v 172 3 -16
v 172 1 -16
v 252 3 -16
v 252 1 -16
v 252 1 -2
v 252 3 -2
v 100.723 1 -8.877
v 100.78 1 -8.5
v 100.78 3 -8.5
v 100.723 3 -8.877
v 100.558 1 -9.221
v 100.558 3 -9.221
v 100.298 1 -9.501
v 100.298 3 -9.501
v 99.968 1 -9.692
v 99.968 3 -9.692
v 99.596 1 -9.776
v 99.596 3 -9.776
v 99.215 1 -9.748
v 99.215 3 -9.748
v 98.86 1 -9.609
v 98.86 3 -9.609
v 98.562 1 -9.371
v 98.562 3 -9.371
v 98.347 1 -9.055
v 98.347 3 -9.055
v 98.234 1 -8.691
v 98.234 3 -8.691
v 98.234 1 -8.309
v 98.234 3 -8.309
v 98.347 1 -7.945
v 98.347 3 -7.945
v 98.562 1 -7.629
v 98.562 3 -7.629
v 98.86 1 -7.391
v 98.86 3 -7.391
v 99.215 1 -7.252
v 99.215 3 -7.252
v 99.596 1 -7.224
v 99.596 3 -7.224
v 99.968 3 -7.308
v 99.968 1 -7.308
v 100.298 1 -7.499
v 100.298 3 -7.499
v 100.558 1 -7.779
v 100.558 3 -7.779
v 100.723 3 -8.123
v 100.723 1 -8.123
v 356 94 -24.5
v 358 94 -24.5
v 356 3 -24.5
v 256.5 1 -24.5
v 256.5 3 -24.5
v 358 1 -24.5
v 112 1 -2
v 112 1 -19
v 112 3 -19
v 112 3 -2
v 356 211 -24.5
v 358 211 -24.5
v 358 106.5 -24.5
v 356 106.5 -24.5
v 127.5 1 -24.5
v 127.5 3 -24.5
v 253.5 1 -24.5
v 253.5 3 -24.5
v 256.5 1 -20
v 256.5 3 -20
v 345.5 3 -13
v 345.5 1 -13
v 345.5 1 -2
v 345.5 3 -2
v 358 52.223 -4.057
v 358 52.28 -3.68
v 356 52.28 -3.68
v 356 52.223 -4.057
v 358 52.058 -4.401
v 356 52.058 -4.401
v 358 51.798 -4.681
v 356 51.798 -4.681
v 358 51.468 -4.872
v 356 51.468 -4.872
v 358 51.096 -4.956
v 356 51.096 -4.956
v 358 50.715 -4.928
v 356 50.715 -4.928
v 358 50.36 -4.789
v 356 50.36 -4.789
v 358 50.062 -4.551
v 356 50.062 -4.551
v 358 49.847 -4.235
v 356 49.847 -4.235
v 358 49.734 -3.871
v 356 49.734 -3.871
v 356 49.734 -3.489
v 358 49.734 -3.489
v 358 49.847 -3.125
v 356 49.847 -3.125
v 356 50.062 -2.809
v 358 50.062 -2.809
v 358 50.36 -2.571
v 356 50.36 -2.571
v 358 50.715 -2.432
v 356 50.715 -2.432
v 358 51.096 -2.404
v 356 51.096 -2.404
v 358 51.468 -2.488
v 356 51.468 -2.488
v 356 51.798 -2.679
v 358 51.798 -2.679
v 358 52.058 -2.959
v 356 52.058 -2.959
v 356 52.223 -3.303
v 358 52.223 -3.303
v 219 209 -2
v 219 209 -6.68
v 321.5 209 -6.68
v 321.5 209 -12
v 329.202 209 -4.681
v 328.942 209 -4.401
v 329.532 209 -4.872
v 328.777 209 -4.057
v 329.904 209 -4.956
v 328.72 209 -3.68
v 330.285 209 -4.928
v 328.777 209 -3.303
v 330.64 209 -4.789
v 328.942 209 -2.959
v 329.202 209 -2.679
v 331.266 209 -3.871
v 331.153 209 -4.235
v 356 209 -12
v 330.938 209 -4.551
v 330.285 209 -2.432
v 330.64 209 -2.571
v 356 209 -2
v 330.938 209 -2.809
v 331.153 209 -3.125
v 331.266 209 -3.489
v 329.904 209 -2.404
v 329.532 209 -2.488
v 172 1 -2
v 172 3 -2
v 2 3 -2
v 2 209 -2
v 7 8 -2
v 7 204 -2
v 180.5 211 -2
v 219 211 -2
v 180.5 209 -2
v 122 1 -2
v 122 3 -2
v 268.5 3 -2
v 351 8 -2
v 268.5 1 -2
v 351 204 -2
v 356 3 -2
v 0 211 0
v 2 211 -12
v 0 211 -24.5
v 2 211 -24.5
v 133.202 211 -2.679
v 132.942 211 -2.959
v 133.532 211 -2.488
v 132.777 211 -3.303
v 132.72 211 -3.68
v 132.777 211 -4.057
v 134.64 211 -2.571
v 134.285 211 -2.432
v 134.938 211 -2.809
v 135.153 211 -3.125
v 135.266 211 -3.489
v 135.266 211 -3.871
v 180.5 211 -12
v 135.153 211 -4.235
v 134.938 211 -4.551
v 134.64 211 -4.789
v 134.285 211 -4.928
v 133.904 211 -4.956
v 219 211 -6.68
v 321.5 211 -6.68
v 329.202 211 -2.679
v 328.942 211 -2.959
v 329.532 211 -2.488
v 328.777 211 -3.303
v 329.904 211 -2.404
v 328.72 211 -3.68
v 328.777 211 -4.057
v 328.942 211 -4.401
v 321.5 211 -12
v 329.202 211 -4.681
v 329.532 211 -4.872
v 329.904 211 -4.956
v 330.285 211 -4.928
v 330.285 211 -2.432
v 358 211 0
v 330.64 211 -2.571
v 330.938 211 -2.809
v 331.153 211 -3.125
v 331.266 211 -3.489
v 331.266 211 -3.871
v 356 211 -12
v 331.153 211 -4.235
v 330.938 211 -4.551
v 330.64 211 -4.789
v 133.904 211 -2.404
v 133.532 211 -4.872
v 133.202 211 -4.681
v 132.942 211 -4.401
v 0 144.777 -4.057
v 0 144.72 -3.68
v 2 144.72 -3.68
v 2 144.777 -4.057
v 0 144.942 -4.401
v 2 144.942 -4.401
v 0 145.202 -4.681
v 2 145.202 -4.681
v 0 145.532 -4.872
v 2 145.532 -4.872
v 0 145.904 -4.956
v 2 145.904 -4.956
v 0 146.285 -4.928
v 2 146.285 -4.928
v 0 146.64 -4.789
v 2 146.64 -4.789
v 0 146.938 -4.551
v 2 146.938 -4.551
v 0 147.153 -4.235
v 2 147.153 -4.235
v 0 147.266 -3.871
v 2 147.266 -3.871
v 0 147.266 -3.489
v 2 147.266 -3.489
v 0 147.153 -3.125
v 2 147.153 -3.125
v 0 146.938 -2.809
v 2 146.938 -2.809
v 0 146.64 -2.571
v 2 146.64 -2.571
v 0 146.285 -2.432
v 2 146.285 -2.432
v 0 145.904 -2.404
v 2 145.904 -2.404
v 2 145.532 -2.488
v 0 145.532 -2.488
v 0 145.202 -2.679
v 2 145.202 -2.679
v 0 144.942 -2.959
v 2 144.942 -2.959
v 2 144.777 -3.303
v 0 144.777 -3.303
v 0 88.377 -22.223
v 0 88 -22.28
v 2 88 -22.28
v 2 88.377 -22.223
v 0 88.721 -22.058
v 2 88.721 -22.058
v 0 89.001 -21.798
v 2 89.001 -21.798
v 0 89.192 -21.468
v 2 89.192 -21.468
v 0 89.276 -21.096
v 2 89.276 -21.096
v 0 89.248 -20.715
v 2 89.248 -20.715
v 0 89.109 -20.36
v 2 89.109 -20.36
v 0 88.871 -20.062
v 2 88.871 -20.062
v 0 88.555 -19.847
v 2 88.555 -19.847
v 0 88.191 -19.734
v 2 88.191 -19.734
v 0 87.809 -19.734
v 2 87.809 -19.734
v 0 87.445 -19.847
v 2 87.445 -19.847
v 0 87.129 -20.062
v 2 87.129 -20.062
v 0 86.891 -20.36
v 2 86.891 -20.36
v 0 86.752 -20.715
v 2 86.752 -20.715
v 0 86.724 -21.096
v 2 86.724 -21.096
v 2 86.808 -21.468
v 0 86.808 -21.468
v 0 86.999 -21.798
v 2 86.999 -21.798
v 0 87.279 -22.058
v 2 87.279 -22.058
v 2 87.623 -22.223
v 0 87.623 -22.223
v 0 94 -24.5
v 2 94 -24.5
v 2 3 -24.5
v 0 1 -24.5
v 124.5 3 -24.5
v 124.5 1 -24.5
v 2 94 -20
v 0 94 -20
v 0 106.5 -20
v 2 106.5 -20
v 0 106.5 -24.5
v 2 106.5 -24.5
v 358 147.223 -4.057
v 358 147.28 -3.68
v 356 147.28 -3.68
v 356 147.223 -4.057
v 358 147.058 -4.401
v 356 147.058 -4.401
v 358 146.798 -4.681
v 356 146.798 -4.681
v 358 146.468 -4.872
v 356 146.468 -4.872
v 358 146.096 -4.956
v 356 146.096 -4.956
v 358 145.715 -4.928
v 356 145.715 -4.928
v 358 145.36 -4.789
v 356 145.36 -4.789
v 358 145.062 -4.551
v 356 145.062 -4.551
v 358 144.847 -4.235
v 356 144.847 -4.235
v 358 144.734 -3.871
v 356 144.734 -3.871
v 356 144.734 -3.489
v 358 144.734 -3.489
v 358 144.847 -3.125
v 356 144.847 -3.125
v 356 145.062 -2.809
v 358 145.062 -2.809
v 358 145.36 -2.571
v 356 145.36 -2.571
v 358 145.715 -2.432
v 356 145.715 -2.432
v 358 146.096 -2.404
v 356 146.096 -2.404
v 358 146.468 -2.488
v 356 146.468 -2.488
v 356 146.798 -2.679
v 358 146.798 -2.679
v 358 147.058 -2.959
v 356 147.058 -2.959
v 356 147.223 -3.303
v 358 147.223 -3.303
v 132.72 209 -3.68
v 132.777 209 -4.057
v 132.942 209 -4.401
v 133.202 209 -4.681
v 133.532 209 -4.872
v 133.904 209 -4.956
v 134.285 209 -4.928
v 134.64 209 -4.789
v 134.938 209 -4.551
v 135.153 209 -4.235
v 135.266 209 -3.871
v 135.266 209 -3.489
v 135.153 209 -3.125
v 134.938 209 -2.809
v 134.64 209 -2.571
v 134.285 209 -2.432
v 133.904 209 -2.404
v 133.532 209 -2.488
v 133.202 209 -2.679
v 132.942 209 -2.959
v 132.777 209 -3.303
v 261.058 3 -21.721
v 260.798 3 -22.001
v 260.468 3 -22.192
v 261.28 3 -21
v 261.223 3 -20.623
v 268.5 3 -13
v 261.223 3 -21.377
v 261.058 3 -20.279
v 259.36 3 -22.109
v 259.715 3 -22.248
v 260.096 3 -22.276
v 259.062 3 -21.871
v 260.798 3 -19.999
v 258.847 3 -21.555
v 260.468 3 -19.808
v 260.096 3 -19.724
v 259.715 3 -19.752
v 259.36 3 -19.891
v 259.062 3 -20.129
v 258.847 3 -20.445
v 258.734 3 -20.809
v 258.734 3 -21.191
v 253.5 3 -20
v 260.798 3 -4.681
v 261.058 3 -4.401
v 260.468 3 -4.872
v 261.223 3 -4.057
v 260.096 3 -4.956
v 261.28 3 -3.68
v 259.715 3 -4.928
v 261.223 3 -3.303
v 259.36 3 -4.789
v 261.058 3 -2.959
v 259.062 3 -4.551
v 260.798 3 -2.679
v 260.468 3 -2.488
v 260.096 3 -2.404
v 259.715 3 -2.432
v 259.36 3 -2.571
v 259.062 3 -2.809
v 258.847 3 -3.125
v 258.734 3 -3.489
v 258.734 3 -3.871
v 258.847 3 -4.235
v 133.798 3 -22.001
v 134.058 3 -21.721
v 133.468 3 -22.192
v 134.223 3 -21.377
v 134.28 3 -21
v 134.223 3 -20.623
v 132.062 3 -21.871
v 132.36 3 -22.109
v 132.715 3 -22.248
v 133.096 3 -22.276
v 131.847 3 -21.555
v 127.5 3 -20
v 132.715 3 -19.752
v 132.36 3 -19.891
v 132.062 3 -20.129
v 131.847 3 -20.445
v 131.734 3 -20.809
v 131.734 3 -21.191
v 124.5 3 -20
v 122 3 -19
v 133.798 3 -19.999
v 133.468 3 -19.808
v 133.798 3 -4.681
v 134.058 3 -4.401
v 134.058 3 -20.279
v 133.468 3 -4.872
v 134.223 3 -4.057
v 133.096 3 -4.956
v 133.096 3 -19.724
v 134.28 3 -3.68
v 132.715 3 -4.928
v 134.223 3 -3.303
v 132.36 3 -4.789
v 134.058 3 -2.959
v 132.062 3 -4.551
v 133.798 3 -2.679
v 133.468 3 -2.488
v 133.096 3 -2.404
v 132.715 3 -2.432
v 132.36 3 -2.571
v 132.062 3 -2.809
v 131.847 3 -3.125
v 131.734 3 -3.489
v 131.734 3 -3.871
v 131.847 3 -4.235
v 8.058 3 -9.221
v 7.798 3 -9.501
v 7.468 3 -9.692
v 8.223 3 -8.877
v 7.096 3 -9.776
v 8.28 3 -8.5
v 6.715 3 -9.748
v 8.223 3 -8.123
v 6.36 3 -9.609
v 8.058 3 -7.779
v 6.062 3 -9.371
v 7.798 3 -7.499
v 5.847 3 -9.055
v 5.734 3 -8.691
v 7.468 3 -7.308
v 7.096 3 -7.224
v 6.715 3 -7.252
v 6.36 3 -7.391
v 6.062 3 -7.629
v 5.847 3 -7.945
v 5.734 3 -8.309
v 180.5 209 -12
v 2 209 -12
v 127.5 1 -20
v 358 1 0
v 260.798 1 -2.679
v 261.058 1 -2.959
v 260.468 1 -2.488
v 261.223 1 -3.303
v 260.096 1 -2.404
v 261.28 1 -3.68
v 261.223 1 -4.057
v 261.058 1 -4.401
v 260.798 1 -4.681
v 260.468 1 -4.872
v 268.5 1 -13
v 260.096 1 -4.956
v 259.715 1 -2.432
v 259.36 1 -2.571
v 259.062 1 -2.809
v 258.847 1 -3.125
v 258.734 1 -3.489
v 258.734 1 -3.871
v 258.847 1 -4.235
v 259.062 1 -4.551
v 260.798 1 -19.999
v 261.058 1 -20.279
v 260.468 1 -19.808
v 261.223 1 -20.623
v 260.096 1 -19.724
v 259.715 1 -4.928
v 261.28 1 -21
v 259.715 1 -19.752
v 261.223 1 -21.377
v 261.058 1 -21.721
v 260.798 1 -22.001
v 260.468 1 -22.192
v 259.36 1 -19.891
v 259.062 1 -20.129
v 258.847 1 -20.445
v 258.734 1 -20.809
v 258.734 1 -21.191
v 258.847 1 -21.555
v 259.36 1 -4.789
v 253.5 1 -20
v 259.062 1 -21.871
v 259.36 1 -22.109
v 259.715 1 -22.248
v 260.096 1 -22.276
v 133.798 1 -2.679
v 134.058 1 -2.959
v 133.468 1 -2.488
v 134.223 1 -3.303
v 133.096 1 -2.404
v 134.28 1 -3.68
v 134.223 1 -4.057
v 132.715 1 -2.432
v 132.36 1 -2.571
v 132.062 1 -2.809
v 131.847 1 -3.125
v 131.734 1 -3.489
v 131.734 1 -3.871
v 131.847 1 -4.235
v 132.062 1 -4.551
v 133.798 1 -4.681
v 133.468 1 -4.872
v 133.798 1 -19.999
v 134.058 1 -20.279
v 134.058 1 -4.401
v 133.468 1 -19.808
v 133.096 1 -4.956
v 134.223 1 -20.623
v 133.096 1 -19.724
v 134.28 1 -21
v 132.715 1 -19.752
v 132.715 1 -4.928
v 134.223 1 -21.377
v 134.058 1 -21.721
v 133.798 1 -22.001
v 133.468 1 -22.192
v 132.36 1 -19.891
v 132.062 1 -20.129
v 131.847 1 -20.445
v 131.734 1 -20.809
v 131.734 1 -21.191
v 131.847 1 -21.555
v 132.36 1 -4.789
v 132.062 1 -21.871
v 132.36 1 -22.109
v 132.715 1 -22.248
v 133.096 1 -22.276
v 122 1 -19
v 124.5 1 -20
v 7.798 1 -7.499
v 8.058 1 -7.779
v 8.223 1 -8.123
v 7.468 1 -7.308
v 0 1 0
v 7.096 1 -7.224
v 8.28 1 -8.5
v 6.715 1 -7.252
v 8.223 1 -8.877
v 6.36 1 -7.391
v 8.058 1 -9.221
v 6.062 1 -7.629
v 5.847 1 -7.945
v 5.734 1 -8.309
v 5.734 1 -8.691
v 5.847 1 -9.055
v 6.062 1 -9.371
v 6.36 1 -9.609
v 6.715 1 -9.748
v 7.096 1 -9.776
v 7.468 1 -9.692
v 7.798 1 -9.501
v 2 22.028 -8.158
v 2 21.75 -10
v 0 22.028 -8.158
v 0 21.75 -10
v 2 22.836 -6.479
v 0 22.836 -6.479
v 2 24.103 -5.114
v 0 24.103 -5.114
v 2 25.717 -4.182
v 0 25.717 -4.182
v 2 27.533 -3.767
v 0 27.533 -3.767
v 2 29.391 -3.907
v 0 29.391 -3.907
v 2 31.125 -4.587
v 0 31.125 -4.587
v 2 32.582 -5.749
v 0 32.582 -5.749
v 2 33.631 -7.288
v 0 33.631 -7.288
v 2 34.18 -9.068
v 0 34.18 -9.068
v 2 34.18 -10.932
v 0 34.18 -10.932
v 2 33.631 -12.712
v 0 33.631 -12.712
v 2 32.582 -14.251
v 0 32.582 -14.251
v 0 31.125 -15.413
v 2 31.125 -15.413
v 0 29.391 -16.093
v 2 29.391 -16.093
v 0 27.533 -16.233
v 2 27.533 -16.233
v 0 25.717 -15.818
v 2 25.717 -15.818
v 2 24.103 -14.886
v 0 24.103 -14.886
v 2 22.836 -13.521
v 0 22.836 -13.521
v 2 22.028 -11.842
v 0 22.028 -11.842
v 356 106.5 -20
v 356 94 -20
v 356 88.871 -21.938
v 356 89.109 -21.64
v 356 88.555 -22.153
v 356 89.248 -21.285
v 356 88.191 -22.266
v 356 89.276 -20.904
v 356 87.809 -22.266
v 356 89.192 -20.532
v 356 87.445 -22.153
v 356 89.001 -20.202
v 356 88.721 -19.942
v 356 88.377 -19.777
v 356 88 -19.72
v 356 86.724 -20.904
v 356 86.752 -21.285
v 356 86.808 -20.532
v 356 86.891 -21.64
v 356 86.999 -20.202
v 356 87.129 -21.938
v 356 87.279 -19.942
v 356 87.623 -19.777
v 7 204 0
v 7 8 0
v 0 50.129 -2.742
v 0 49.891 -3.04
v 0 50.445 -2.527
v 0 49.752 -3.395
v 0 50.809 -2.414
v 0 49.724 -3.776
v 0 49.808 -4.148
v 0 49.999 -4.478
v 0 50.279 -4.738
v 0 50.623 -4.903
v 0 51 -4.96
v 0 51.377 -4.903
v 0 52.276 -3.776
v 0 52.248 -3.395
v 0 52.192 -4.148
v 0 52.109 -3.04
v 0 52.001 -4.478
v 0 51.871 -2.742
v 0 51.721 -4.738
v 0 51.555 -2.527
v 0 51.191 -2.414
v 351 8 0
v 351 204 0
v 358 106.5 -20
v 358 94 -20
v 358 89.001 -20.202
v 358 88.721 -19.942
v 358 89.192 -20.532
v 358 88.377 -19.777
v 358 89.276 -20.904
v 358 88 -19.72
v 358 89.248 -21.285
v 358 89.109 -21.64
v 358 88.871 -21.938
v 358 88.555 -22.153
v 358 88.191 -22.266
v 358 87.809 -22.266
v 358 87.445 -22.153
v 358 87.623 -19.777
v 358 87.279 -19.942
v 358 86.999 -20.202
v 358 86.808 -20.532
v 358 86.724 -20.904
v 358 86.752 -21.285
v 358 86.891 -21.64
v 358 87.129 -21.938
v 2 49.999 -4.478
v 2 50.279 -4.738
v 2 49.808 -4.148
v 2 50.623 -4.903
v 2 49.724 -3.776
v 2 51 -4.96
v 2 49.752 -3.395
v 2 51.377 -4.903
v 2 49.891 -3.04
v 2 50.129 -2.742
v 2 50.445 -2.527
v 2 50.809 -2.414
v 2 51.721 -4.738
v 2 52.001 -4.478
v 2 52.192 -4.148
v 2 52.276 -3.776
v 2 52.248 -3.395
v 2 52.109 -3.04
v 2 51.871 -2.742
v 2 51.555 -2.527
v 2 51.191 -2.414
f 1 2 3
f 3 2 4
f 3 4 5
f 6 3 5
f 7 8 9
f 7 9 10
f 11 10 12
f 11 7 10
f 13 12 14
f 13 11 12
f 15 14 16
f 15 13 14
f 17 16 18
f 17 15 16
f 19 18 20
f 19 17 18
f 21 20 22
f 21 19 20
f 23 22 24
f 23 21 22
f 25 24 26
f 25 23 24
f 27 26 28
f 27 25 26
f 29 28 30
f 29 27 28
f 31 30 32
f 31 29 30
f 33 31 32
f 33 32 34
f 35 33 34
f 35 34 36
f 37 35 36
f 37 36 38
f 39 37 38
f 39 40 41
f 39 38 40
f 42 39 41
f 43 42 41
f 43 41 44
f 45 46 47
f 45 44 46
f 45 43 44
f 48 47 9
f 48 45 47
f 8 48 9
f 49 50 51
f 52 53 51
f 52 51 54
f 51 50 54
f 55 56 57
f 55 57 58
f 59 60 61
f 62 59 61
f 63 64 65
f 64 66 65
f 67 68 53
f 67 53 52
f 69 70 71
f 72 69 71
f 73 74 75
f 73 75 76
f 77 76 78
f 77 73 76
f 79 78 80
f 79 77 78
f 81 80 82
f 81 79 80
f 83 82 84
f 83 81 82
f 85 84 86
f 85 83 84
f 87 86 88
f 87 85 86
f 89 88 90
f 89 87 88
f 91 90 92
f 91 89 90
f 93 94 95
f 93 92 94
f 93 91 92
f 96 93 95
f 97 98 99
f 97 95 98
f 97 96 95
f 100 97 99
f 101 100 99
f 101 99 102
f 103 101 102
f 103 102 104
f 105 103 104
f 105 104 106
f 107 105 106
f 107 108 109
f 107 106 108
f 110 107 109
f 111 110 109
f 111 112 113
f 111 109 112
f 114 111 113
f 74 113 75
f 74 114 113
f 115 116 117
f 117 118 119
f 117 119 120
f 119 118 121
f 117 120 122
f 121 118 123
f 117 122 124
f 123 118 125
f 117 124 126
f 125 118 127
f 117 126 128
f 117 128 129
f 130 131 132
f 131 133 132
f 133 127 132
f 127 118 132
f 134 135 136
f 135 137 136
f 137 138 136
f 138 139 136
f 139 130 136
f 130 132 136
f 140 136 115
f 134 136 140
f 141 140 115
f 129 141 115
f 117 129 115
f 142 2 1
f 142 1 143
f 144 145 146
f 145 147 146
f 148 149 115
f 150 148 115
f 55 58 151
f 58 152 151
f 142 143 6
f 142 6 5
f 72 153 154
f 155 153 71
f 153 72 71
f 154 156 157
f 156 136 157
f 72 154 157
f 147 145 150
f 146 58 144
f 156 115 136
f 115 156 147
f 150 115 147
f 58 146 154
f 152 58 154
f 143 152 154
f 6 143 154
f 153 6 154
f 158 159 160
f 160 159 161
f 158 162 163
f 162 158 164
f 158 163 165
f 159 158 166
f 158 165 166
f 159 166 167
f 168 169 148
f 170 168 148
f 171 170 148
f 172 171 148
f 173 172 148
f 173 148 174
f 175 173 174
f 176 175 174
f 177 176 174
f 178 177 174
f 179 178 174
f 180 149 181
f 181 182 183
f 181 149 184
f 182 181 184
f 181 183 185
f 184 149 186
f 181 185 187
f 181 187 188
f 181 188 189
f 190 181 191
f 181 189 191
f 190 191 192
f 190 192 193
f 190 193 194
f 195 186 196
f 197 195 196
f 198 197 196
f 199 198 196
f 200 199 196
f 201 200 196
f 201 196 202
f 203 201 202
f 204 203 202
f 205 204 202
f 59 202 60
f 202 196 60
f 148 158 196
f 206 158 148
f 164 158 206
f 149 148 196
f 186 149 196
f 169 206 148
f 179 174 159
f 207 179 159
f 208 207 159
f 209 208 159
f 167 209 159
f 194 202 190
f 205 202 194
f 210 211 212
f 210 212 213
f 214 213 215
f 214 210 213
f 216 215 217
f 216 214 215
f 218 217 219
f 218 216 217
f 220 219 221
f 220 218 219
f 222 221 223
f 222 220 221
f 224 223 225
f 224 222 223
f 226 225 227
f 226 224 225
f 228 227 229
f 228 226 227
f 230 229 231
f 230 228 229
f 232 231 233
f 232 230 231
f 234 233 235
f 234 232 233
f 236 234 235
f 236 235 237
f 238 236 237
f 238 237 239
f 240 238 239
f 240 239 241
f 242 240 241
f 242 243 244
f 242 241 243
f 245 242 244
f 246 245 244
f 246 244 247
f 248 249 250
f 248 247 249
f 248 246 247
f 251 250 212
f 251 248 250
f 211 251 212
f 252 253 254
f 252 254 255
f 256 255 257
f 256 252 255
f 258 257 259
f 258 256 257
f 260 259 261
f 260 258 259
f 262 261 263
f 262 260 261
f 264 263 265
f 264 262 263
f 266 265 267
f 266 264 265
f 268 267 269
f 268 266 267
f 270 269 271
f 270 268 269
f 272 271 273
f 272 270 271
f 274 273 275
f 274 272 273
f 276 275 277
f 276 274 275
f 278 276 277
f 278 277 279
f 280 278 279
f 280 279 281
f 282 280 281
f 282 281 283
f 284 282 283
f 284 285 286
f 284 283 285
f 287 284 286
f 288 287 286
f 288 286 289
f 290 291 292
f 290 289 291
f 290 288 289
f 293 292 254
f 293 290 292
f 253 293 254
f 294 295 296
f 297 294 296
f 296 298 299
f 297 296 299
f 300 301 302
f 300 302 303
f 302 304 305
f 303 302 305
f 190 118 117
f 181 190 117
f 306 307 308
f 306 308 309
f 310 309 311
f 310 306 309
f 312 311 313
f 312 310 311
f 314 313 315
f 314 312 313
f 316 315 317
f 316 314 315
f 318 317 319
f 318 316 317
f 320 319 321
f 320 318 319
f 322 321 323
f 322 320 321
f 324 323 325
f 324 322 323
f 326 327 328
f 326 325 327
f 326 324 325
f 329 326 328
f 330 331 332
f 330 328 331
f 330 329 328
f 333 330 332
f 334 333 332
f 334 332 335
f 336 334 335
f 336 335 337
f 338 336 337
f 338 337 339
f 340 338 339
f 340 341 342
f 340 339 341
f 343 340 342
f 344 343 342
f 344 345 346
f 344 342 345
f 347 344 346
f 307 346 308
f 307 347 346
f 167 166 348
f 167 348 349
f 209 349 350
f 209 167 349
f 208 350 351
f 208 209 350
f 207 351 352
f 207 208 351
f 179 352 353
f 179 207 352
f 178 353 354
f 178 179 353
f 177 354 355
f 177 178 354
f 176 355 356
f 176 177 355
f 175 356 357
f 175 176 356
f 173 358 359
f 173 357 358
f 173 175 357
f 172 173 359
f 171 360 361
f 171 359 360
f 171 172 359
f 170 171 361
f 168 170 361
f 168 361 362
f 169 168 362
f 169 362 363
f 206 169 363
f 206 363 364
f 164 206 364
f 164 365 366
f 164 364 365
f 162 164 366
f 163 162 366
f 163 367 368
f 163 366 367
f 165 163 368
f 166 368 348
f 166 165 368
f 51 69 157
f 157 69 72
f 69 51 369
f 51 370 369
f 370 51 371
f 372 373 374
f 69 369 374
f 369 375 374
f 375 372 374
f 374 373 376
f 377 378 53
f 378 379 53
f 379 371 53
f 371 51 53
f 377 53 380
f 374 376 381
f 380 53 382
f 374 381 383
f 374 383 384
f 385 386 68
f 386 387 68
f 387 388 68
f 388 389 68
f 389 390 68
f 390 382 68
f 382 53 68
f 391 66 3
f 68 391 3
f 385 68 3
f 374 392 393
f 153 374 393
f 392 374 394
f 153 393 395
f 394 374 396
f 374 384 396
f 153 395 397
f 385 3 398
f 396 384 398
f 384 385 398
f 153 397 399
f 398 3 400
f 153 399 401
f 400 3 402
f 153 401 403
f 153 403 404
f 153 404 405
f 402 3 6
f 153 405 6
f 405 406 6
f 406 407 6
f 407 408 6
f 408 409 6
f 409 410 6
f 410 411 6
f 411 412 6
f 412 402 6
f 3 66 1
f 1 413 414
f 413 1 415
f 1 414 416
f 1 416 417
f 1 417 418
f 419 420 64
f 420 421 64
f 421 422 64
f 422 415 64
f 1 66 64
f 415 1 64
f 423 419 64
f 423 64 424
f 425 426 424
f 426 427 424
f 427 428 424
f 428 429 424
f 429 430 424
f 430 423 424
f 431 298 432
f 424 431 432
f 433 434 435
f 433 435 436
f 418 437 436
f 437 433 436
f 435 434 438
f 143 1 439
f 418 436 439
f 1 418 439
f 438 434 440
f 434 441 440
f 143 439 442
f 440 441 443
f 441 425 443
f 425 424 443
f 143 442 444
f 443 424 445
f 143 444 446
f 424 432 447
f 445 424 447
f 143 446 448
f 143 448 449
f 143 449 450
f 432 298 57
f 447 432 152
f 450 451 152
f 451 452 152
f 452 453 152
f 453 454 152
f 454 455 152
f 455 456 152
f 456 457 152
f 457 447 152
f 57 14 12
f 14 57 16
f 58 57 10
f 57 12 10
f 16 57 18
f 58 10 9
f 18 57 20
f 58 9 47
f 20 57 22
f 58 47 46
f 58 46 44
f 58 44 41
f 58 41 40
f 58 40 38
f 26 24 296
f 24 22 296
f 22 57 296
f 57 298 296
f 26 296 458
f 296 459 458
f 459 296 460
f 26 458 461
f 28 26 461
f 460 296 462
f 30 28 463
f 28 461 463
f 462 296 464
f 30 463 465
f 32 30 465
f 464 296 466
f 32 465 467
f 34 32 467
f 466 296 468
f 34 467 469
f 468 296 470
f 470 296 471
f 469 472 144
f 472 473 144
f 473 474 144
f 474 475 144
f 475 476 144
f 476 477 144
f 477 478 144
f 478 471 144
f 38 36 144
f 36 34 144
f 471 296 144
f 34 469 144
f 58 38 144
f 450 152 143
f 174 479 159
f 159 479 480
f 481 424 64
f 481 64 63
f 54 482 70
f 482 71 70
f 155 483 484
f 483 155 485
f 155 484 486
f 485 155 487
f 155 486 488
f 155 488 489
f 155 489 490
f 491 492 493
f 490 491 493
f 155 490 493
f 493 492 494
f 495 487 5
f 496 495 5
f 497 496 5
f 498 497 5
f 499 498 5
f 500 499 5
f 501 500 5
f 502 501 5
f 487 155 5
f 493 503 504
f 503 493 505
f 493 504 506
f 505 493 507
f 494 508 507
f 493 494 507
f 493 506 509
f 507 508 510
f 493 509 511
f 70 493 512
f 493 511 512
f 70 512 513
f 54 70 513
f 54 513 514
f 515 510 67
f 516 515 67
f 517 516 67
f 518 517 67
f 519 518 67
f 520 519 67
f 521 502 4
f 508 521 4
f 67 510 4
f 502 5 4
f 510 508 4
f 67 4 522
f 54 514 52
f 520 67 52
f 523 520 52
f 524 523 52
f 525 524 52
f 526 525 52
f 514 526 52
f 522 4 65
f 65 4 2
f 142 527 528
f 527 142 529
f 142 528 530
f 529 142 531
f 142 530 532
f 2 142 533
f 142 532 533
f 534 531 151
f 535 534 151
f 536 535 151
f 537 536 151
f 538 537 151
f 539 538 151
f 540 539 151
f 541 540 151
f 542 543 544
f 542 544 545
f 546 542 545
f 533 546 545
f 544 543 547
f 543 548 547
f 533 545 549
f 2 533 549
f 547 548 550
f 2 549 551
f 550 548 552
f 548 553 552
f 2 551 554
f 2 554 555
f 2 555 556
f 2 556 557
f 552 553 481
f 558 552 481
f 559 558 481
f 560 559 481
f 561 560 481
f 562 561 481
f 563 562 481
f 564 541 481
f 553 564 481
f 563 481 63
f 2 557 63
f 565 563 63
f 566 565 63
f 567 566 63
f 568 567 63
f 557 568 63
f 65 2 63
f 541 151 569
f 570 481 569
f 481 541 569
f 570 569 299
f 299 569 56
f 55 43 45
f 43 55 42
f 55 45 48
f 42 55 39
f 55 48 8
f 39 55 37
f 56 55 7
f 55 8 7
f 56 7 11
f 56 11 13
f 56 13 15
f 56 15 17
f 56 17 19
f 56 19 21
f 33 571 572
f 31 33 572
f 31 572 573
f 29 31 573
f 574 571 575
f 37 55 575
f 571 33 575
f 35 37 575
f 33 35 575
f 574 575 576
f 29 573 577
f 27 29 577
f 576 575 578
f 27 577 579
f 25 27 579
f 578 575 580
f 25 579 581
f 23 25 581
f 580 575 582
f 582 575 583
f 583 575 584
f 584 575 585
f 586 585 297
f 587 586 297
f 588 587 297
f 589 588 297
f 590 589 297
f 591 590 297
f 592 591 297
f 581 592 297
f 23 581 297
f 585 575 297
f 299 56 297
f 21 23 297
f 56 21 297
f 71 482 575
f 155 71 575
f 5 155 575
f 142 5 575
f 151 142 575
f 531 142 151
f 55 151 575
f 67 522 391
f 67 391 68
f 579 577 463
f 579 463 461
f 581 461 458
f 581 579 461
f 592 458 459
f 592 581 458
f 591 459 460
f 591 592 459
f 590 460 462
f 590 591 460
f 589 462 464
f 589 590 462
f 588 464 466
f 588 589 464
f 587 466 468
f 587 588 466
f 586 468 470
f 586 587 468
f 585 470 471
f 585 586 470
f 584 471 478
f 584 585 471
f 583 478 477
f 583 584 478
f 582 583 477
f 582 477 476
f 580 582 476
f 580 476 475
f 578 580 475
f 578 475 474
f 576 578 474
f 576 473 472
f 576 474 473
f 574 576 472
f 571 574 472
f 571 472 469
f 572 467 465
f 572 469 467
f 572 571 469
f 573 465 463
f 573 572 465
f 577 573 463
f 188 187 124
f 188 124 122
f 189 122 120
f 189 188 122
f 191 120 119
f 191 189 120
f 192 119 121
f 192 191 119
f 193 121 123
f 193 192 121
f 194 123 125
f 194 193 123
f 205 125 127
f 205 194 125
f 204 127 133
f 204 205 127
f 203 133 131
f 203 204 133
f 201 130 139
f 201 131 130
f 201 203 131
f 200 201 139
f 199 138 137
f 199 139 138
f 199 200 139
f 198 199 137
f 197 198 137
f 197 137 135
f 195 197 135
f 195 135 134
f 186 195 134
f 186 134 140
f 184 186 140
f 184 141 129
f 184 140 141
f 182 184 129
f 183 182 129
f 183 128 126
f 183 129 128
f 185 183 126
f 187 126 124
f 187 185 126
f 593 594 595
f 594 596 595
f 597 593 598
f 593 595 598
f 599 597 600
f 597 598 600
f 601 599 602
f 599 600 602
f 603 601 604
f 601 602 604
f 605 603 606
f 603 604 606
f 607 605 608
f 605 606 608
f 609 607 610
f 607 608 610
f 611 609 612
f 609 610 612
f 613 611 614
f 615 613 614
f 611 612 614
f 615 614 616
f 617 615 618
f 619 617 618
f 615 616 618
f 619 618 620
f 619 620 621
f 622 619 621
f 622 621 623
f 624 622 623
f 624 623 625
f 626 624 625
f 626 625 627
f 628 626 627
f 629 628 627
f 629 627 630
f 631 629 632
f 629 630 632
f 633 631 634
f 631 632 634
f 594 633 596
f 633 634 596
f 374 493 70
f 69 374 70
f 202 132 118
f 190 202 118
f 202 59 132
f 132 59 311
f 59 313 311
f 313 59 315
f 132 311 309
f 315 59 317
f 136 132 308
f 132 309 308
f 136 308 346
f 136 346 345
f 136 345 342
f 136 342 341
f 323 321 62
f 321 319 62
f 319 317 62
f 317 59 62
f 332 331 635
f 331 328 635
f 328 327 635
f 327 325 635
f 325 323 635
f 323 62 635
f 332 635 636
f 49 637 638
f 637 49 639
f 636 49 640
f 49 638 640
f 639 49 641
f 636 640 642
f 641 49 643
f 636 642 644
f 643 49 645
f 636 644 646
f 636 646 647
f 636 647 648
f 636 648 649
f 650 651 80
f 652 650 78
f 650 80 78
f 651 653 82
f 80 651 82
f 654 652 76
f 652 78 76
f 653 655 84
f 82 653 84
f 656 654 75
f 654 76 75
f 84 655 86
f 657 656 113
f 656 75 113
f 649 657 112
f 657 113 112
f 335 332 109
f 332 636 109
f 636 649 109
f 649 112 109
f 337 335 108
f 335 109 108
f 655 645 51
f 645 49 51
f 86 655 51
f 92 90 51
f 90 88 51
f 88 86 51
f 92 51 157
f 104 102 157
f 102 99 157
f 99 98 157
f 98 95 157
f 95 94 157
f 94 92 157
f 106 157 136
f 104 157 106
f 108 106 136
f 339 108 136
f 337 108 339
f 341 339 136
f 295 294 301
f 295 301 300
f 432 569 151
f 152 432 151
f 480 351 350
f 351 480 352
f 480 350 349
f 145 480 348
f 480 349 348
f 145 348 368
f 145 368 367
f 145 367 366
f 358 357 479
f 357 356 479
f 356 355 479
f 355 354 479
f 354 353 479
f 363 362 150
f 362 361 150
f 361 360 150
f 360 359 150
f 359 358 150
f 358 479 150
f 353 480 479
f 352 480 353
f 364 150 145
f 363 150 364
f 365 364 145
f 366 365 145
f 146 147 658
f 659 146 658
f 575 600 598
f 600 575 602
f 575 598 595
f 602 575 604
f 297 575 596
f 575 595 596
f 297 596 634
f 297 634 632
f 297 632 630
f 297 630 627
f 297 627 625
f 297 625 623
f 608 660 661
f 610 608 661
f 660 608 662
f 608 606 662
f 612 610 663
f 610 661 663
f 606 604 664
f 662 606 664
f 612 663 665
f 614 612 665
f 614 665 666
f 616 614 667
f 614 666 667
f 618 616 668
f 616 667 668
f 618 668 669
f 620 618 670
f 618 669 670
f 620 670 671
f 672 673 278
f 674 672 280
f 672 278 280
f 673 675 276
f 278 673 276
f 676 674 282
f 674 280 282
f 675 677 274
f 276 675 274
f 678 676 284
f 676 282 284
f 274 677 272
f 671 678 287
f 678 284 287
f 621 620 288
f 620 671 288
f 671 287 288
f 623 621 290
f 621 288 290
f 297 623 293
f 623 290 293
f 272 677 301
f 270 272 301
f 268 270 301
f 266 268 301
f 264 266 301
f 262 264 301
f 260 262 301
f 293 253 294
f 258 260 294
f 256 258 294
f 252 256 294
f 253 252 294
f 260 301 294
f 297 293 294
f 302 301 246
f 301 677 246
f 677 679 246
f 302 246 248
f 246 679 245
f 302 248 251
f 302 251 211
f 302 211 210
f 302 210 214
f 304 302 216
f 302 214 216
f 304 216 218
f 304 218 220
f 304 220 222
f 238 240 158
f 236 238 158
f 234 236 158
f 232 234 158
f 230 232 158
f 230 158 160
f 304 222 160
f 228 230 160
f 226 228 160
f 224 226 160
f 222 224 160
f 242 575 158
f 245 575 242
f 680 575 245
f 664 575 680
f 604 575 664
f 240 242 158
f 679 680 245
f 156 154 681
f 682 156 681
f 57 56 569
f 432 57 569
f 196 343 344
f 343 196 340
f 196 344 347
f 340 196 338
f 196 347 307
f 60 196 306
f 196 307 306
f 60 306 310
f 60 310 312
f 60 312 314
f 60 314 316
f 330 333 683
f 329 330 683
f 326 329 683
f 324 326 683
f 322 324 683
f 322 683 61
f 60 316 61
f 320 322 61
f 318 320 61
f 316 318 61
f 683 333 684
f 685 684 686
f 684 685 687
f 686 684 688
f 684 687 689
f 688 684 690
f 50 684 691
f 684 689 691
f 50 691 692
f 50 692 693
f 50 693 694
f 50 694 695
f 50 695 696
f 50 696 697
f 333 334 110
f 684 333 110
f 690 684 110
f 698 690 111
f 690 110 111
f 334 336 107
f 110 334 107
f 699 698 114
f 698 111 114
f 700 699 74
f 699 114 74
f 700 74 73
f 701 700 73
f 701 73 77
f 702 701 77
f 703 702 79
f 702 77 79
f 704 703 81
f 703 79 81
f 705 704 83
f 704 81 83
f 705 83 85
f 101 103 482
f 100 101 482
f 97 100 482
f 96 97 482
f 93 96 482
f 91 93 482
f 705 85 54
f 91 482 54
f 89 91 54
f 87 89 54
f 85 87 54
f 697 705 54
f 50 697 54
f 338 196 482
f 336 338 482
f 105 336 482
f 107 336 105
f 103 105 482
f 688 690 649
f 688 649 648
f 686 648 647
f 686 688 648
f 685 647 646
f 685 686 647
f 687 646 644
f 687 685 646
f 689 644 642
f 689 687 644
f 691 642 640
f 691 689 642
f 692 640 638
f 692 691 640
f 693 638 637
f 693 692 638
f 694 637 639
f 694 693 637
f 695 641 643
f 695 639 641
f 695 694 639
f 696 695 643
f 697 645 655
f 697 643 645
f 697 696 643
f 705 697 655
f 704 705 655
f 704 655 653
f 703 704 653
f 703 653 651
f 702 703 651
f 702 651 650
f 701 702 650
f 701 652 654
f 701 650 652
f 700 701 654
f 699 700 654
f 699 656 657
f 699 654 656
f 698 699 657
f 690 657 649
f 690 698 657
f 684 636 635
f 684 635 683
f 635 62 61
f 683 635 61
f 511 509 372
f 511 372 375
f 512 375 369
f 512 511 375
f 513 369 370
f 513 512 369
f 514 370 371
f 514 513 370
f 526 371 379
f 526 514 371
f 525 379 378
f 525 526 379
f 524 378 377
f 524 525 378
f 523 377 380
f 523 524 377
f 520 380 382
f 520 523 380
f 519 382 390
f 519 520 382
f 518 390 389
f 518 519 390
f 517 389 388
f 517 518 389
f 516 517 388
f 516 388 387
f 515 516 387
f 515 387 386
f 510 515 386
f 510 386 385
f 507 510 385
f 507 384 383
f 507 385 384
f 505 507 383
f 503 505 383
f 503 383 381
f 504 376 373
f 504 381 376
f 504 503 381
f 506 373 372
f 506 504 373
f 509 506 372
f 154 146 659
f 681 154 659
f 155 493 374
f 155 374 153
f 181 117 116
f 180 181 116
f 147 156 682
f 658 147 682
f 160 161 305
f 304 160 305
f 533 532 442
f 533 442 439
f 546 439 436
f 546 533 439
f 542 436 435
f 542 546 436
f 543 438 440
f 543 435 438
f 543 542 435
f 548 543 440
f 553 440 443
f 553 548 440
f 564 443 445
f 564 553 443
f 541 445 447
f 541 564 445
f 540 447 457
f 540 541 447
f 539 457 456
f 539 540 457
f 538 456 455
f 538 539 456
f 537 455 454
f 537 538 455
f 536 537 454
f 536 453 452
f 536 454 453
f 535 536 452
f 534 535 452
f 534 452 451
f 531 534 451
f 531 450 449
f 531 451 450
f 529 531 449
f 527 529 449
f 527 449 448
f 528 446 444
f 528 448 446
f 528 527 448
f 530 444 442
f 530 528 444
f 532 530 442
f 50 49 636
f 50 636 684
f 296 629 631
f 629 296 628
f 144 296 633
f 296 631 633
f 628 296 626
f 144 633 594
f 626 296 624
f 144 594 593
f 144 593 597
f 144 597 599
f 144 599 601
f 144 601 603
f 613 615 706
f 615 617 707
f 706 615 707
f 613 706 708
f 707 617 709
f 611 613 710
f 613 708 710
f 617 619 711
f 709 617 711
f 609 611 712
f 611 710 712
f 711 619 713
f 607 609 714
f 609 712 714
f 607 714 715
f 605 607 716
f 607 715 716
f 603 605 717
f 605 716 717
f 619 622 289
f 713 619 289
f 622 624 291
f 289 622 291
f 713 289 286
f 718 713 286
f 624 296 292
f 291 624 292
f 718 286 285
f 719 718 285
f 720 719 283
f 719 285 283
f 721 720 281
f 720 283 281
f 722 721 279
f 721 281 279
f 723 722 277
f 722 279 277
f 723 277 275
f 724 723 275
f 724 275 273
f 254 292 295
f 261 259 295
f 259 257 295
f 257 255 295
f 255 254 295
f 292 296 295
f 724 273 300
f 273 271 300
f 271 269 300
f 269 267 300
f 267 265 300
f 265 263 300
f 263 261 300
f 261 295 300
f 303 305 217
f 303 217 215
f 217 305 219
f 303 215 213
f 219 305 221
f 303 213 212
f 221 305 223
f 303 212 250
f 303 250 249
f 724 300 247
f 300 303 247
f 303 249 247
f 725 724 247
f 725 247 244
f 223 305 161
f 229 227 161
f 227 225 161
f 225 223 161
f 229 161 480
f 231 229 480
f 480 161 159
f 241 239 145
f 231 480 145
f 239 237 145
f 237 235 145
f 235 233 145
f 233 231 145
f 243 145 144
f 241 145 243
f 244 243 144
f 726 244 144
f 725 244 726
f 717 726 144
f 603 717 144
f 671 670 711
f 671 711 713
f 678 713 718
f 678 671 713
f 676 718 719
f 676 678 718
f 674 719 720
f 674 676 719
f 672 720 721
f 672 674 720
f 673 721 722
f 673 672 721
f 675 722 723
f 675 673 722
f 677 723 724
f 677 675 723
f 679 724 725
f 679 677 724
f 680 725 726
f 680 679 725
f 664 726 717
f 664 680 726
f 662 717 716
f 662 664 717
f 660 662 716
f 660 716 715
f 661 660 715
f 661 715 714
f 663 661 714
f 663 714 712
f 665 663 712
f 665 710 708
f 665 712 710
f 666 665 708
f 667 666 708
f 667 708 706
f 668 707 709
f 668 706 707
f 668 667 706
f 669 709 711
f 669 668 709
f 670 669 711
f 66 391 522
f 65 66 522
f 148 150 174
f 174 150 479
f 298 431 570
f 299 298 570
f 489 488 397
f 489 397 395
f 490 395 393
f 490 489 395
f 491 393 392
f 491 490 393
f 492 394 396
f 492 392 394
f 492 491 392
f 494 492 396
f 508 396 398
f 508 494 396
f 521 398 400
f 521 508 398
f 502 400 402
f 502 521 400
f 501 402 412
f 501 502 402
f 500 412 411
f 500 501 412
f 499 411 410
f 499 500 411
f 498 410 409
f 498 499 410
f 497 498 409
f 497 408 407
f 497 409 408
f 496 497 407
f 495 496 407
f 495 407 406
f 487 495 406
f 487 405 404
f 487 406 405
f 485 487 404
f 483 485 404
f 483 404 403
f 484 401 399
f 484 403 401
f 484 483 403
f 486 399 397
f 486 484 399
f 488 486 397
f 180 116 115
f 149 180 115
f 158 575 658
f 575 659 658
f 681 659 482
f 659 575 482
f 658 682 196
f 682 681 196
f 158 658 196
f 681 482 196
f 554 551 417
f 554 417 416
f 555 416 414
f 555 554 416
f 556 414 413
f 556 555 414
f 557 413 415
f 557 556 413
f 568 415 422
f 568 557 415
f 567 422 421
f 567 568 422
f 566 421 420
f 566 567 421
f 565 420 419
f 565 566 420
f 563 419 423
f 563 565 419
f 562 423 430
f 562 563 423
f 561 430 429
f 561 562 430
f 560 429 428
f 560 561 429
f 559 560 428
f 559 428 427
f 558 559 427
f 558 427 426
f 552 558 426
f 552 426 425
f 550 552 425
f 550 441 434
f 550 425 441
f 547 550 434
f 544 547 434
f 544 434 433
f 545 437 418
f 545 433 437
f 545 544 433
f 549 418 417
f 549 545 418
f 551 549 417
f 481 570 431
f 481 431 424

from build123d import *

# Parameters (mm, degrees)
EXTRUDE022_DEPTH        = 11
SKETCH124_W             = 3
SKETCH124_H             = 12.5
SKETCH124_H_2           = 3
EXTRUDE114_DEPTH        = 6
SKETCH126_R             = 1.28
EXTRUDE116_DEPTH        = 10
BODY064_PLACEMENT_ANGLE = 90
BODY068_PLACEMENT_ANGLE = 90
BODY069_PLACEMENT_ANGLE = 90
BODY070_PLACEMENT_ANGLE = 90
BODY071_PLACEMENT_ANGLE = 90
BODY072_ROLL_ANGLE      = -90
BODY072_PLACEMENT_ANGLE = 90
BODY076_ROLL_ANGLE      = -90
BODY076_PLACEMENT_ANGLE = -90
BODY077_ROLL_ANGLE      = -90
BODY077_PLACEMENT_ANGLE = 90
BODY078_ROLL_ANGLE      = -90
BODY078_PLACEMENT_ANGLE = 180
BODY079_ROLL_ANGLE      = -90
BODY079_PLACEMENT_ANGLE = 180
BODY086_PLACEMENT_ANGLE = 90
BODY087_PLACEMENT_ANGLE = 90
BODY088_PLACEMENT_ANGLE = 90
BODY089_PLACEMENT_ANGLE = 90
SKETCH133_R             = 6.25
EXTRUDE123_DEPTH        = 1
EXTRUDE123_DEPTH_BACK   = 10
SKETCH055_W             = 80
SKETCH055_H             = 14
SKETCH055_W_2           = 77
SKETCH055_H_2           = 11
SKETCH055_W_3           = 10
SKETCH055_H_3           = 17
EXTRUDE045_DEPTH        = 8


with BuildPart() as rear_holes002:
    # Sketch028 → Extrude022 (new body)
    with BuildSketch(Plane(origin=(0, 203, 0), x_dir=(-1, 0, 0), z_dir=(0, 1, 0))):
        Polygon((-2, -26), (-356, -26), (-356, -12), (-321.5, -12), (-321.5, -6.68), (-219, -6.68), (-219, -2), (-180.5, -2), (-180.5, -12), (-2, -12), align=None)
    extrude(amount=EXTRUDE022_DEPTH)


with BuildPart() as extrude114:
    # Sketch124 → Extrude114 (new body)
    with BuildSketch(Plane(origin=(0, 0, -26), x_dir=(1, 0, 0), z_dir=(0, 0, -1))):
        with Locations((1, -100.25)):
            Rectangle(SKETCH124_W, SKETCH124_H)
        with Locations((357, -100.25)):
            Rectangle(SKETCH124_W, SKETCH124_H)
        with Locations((126, -2)):
            Rectangle(SKETCH124_W, SKETCH124_H_2)
        with Locations((255, -2)):
            Rectangle(SKETCH124_W, SKETCH124_H_2)
    extrude(amount=-EXTRUDE114_DEPTH)


with BuildPart() as screw_inner:
    # Sketch126 → Extrude116 (new body)
    with BuildSketch(Plane.XY):
        Circle(SKETCH126_R)
    extrude(amount=EXTRUDE116_DEPTH)


with BuildPart() as screw_inner001:
    # Body064 base: copy of screw inner
    add(screw_inner.part)


with BuildPart() as screw_inner001_1:
    # Body064 placement: moved
    add(screw_inner001.part.moved(Location((-1.5, 51, -3.68))).rotate(Axis((-1.5, 51, -3.68), (0, 1, 0)), BODY064_PLACEMENT_ANGLE))


with BuildPart() as screw_inner002:
    # Body068 base: copy of screw inner
    add(screw_inner.part)


with BuildPart() as screw_inner002_1:
    # Body068 placement: moved
    add(screw_inner002.part.moved(Location((7, -1, -8.5))).rotate(Axis((7, -1, -8.5), (-1, 0, 0)), BODY068_PLACEMENT_ANGLE))


with BuildPart() as screw_inner003:
    # Body069 base: copy of screw inner
    add(screw_inner.part)


with BuildPart() as screw_inner003_1:
    # Body069 placement: moved
    add(screw_inner003.part.moved(Location((99.5, -1, -8.5))).rotate(Axis((99.5, -1, -8.5), (-1, 0, 0)), BODY069_PLACEMENT_ANGLE))


with BuildPart() as screw_inner004:
    # Body070 base: copy of screw inner
    add(screw_inner.part)


with BuildPart() as screw_inner004_1:
    # Body070 placement: moved
    add(screw_inner004.part.moved(Location((133, -1, -3.68))).rotate(Axis((133, -1, -3.68), (-1, 0, 0)), BODY070_PLACEMENT_ANGLE))


with BuildPart() as screw_inner005:
    # Body071 base: copy of screw inner
    add(screw_inner.part)


with BuildPart() as screw_inner005_1:
    # Body071 placement: moved
    add(screw_inner005.part.moved(Location((260, -1, -3.68))).rotate(Axis((260, -1, -3.68), (-1, 0, 0)), BODY071_PLACEMENT_ANGLE))


with BuildPart() as screw_inner006:
    # Body072 base: copy of screw inner
    add(screw_inner.part)


with BuildPart() as screw_inner006_1:
    # Body072 roll: moved
    add(screw_inner006.part.rotate(Axis((0, 0, 0), (1, 0, 0)), BODY072_ROLL_ANGLE))


with BuildPart() as screw_inner006_2:
    # Body072 placement: moved
    add(screw_inner006_1.part.moved(Location((360, 51, -3.68))).rotate(Axis((360, 51, -3.68), (0, 0, 1)), BODY072_PLACEMENT_ANGLE))


with BuildPart() as screw_inner007:
    # Body076 base: copy of screw inner
    add(screw_inner.part)


with BuildPart() as screw_inner007_1:
    # Body076 roll: moved
    add(screw_inner007.part.rotate(Axis((0, 0, 0), (1, 0, 0)), BODY076_ROLL_ANGLE))


with BuildPart() as screw_inner007_2:
    # Body076 placement: moved
    add(screw_inner007_1.part.moved(Location((-2, 146, -3.68))).rotate(Axis((-2, 146, -3.68), (0, 0, 1)), BODY076_PLACEMENT_ANGLE))


with BuildPart() as screw_inner008:
    # Body077 base: copy of screw inner
    add(screw_inner.part)


with BuildPart() as screw_inner008_1:
    # Body077 roll: moved
    add(screw_inner008.part.rotate(Axis((0, 0, 0), (1, 0, 0)), BODY077_ROLL_ANGLE))


with BuildPart() as screw_inner008_2:
    # Body077 placement: moved
    add(screw_inner008_1.part.moved(Location((360, 146, -3.68))).rotate(Axis((360, 146, -3.68), (0, 0, 1)), BODY077_PLACEMENT_ANGLE))


with BuildPart() as screw_inner009:
    # Body078 base: copy of screw inner
    add(screw_inner.part)


with BuildPart() as screw_inner009_1:
    # Body078 roll: moved
    add(screw_inner009.part.rotate(Axis((0, 0, 0), (1, 0, 0)), BODY078_ROLL_ANGLE))


with BuildPart() as screw_inner009_2:
    # Body078 placement: moved
    add(screw_inner009_1.part.moved(Location((134, 213, -3.68))).rotate(Axis((134, 213, -3.68), (0, 0, 1)), BODY078_PLACEMENT_ANGLE))


with BuildPart() as screw_inner010:
    # Body079 base: copy of screw inner
    add(screw_inner.part)


with BuildPart() as screw_inner010_1:
    # Body079 roll: moved
    add(screw_inner010.part.rotate(Axis((0, 0, 0), (1, 0, 0)), BODY079_ROLL_ANGLE))


with BuildPart() as screw_inner010_2:
    # Body079 placement: moved
    add(screw_inner010_1.part.moved(Location((330, 213, -3.68))).rotate(Axis((330, 213, -3.68), (0, 0, 1)), BODY079_PLACEMENT_ANGLE))


with BuildPart() as screw_inner011:
    # Body086 base: copy of screw inner
    add(screw_inner.part)


with BuildPart() as screw_inner011_1:
    # Body086 placement: moved
    add(screw_inner011.part.moved(Location((-1, 88, -21))).rotate(Axis((-1, 88, -21), (0, 1, 0)), BODY086_PLACEMENT_ANGLE))


with BuildPart() as screw_inner012:
    # Body087 base: copy of screw inner
    add(screw_inner.part)


with BuildPart() as screw_inner012_1:
    # Body087 placement: moved
    add(screw_inner012.part.moved(Location((359, 88, -21))).rotate(Axis((359, 88, -21), (0, -1, 0)), BODY087_PLACEMENT_ANGLE))


with BuildPart() as screw_inner013:
    # Body088 base: copy of screw inner
    add(screw_inner.part)


with BuildPart() as screw_inner013_1:
    # Body088 placement: moved
    add(screw_inner013.part.moved(Location((133, 0, -21))).rotate(Axis((133, 0, -21), (-1, 0, 0)), BODY088_PLACEMENT_ANGLE))


with BuildPart() as screw_inner014:
    # Body089 base: copy of screw inner
    add(screw_inner.part)


with BuildPart() as screw_inner014_1:
    # Body089 placement: moved
    add(screw_inner014.part.moved(Location((260, 0, -21))).rotate(Axis((260, 0, -21), (-1, 0, 0)), BODY089_PLACEMENT_ANGLE))


with BuildPart() as power_hole002:
    # Sketch133 → Extrude123 (new body, two sides)
    with BuildSketch(Plane(origin=(-3, 0, 0), x_dir=(0, -1, 0), z_dir=(-1, 0, 0))) as extrude123_sk:
        with Locations((-28, -10)):
            Circle(SKETCH133_R)
    extrude(amount=EXTRUDE123_DEPTH)
    extrude(extrude123_sk.sketch, amount=-EXTRUDE123_DEPTH_BACK)


with BuildPart() as compound012:
    # Sketch055 → Extrude045 (new body)
    with BuildSketch(Plane.XZ.offset(3)):
        with Locations((212, -9)):
            Rectangle(SKETCH055_W, SKETCH055_H)
        with Locations((307, -7.5)):
            Rectangle(SKETCH055_W_2, SKETCH055_H_2)
        with Locations((117, -10.5)):
            Rectangle(SKETCH055_W_3, SKETCH055_H_3)
    extrude(amount=-EXTRUDE045_DEPTH)

    # Compound012: union rear holes002, Extrude114, screw inner001, screw inner002, screw inner003, screw inner004, screw inner005, screw inner006, screw inner007, screw inner008, screw inner009, screw inner010, screw inner011, screw inner012, screw inner013, screw inner014, power hole002
    add(rear_holes002.part)
    add(extrude114.part)
    add(screw_inner001_1.part)
    add(screw_inner002_1.part)
    add(screw_inner003_1.part)
    add(screw_inner004_1.part)
    add(screw_inner005_1.part)
    add(screw_inner006_2.part)
    add(screw_inner007_2.part)
    add(screw_inner008_2.part)
    add(screw_inner009_2.part)
    add(screw_inner010_2.part)
    add(screw_inner011_1.part)
    add(screw_inner012_1.part)
    add(screw_inner013_1.part)
    add(screw_inner014_1.part)
    add(power_hole002.part)


with BuildPart() as side003:
    # Sweep001: sweep along a path in Sketch004
    with BuildLine(Plane.XY) as sweep001_path:
        Line((-0.5, 211.5), (358.5, 211.5))
        Line((358.5, 211.5), (358.5, 0.5))
        Line((358.5, 0.5), (-0.5, 0.5))
        Line((-0.5, 0.5), (-0.5, 211.5))
    # Sketch003 → Sweep001 (sweep)
    with BuildSketch(Plane.XZ.offset(-14)):
        Polygon((7, -2), (7, 0), (0, 0), (0, -24.5), (2, -24.5), (2, -2), align=None)
    sweep(path=sweep001_path.line, transition=Transition.RIGHT)

    # Cut004: cut Compound012
    add(compound012.part, mode=Mode.SUBTRACT)


solid = side003.part
